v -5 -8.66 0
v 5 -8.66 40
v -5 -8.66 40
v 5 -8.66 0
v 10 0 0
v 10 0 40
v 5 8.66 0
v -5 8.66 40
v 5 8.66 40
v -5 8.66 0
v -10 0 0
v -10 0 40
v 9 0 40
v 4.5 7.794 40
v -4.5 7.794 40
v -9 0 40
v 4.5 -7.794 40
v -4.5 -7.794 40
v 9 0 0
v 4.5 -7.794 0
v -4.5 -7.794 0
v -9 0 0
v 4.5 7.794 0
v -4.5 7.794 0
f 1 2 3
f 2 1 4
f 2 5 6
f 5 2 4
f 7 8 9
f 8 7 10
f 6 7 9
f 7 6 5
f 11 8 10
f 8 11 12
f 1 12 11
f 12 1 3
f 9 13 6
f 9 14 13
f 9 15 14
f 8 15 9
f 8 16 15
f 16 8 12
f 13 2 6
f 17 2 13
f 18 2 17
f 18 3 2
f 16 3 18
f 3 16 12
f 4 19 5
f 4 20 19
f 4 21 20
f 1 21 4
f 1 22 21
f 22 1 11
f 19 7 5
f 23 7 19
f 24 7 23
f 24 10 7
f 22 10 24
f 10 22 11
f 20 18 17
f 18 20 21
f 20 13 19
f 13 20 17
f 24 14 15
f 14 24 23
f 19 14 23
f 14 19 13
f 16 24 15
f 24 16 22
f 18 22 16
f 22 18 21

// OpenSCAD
//Jessica Kang
difference() {
     cylinder(h=40, r=10, $fn = 6);
       #cylinder(h=41, r=9, $fn = 6);
}
